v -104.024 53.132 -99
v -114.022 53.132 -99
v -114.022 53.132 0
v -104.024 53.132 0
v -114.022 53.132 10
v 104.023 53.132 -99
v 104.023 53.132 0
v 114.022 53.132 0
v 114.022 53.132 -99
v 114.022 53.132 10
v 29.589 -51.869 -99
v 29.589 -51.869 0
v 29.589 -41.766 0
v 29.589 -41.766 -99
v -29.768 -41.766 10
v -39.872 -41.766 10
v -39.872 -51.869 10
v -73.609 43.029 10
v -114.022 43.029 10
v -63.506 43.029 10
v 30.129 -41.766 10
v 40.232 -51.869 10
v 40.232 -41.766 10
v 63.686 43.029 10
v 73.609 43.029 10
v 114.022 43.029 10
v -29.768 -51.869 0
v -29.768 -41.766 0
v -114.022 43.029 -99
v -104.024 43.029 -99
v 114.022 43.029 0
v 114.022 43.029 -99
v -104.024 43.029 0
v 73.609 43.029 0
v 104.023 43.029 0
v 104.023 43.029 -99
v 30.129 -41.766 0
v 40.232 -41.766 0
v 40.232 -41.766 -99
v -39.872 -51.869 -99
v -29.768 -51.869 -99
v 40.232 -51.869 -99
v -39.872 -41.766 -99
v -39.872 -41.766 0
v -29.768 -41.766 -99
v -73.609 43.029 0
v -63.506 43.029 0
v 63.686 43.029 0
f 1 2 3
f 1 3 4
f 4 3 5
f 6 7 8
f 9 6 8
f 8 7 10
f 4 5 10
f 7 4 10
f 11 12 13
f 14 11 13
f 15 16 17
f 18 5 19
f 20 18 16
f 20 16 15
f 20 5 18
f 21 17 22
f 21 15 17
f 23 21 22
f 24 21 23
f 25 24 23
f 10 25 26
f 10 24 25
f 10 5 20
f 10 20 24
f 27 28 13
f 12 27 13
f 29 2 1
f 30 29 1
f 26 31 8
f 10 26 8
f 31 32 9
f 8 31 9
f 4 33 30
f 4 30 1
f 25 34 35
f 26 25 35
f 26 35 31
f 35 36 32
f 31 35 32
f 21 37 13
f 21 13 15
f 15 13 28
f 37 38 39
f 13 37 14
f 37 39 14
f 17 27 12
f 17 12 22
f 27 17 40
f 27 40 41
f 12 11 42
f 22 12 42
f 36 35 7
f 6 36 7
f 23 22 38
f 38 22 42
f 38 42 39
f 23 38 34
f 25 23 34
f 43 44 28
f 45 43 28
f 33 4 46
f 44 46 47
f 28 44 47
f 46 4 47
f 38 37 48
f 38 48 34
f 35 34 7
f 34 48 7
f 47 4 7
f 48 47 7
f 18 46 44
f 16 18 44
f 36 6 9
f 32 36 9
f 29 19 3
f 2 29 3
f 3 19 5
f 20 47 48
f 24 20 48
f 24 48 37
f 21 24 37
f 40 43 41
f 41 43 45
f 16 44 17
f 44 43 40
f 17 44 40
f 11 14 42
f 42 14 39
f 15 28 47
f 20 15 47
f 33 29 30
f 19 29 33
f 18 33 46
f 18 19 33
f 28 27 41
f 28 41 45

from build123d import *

# Parameters (mm, degrees)
EXTRUDE1_DEPTH      = 10
EXTRUDE2_DEPTH      = 10
EXTRUDE3_DEPTH      = 10
SKETCH2_W           = 9.998469457
SKETCH2_H           = 10.103213958
SKETCH2_W_2         = 10.103213958
SKETCH2_W_3         = 10.643545952
SKETCH2_W_4         = 9.998494457
EXTRUDE4_DEPTH      = 10
EXTRUDE4_DEPTH_BACK = 99


with BuildPart() as part:
    # Sketch1 → Extrude1 (new body)
    with BuildSketch(Plane.XY):
        Polygon((63.686330841, 43.028866588), (73.609130264, 43.028866588), (114.021986095, 43.028866588), (114.021986095, 53.132080546), (-114.021986095, 53.132080546), (-114.021986095, 43.028866588), (-73.609130264, 43.028866588), (-63.505916306, 43.028866588), align=None)
    extrude(amount=EXTRUDE1_DEPTH)



with BuildPart() as body_2:
    # Sketch1<3> → Extrude2 (new body)
    with BuildSketch(Plane.XY):
        Polygon((40.232441296, -51.869178801), (40.232441296, -41.765964843), (30.129227338, -41.765964843), (-29.768398268, -41.765964843), (-39.871612226, -41.765964843), (-39.871612226, -51.869178801), align=None)
    extrude(amount=EXTRUDE2_DEPTH)


with BuildPart() as part_1:
    add(part.part)

    add(body_2.part)  # Extrude3 merges body 2
    # Sketch1<4> → Extrude3 (add)
    with BuildSketch(Plane.XY):
        Polygon((40.232441296, -41.765964843), (73.609130264, 43.028866588), (63.686330841, 43.028866588), (30.129227338, -41.765964843), align=None)
        Polygon((-29.768398268, -41.765964843), (-63.505916306, 43.028866588), (-73.609130264, 43.028866588), (-39.871612226, -41.765964843), align=None)
    extrude(amount=EXTRUDE3_DEPTH)

    # Sketch2 → Extrude4 (add, two sides)
    with BuildSketch(Plane.XY) as extrude4_sk:
        with Locations((-109.022751367, 48.080473567)):
            Rectangle(SKETCH2_W, SKETCH2_H)
        with Locations((-34.820005247, -46.817571822)):
            Rectangle(SKETCH2_W_2, SKETCH2_H)
        with Locations((34.91066832, -46.817571822)):
            Rectangle(SKETCH2_W_3, SKETCH2_H)
        with Locations((109.022738867, 48.080473567)):
            Rectangle(SKETCH2_W_4, SKETCH2_H)
    extrude(amount=EXTRUDE4_DEPTH)
    extrude(extrude4_sk.sketch, amount=-EXTRUDE4_DEPTH_BACK)


solid = part_1.part
